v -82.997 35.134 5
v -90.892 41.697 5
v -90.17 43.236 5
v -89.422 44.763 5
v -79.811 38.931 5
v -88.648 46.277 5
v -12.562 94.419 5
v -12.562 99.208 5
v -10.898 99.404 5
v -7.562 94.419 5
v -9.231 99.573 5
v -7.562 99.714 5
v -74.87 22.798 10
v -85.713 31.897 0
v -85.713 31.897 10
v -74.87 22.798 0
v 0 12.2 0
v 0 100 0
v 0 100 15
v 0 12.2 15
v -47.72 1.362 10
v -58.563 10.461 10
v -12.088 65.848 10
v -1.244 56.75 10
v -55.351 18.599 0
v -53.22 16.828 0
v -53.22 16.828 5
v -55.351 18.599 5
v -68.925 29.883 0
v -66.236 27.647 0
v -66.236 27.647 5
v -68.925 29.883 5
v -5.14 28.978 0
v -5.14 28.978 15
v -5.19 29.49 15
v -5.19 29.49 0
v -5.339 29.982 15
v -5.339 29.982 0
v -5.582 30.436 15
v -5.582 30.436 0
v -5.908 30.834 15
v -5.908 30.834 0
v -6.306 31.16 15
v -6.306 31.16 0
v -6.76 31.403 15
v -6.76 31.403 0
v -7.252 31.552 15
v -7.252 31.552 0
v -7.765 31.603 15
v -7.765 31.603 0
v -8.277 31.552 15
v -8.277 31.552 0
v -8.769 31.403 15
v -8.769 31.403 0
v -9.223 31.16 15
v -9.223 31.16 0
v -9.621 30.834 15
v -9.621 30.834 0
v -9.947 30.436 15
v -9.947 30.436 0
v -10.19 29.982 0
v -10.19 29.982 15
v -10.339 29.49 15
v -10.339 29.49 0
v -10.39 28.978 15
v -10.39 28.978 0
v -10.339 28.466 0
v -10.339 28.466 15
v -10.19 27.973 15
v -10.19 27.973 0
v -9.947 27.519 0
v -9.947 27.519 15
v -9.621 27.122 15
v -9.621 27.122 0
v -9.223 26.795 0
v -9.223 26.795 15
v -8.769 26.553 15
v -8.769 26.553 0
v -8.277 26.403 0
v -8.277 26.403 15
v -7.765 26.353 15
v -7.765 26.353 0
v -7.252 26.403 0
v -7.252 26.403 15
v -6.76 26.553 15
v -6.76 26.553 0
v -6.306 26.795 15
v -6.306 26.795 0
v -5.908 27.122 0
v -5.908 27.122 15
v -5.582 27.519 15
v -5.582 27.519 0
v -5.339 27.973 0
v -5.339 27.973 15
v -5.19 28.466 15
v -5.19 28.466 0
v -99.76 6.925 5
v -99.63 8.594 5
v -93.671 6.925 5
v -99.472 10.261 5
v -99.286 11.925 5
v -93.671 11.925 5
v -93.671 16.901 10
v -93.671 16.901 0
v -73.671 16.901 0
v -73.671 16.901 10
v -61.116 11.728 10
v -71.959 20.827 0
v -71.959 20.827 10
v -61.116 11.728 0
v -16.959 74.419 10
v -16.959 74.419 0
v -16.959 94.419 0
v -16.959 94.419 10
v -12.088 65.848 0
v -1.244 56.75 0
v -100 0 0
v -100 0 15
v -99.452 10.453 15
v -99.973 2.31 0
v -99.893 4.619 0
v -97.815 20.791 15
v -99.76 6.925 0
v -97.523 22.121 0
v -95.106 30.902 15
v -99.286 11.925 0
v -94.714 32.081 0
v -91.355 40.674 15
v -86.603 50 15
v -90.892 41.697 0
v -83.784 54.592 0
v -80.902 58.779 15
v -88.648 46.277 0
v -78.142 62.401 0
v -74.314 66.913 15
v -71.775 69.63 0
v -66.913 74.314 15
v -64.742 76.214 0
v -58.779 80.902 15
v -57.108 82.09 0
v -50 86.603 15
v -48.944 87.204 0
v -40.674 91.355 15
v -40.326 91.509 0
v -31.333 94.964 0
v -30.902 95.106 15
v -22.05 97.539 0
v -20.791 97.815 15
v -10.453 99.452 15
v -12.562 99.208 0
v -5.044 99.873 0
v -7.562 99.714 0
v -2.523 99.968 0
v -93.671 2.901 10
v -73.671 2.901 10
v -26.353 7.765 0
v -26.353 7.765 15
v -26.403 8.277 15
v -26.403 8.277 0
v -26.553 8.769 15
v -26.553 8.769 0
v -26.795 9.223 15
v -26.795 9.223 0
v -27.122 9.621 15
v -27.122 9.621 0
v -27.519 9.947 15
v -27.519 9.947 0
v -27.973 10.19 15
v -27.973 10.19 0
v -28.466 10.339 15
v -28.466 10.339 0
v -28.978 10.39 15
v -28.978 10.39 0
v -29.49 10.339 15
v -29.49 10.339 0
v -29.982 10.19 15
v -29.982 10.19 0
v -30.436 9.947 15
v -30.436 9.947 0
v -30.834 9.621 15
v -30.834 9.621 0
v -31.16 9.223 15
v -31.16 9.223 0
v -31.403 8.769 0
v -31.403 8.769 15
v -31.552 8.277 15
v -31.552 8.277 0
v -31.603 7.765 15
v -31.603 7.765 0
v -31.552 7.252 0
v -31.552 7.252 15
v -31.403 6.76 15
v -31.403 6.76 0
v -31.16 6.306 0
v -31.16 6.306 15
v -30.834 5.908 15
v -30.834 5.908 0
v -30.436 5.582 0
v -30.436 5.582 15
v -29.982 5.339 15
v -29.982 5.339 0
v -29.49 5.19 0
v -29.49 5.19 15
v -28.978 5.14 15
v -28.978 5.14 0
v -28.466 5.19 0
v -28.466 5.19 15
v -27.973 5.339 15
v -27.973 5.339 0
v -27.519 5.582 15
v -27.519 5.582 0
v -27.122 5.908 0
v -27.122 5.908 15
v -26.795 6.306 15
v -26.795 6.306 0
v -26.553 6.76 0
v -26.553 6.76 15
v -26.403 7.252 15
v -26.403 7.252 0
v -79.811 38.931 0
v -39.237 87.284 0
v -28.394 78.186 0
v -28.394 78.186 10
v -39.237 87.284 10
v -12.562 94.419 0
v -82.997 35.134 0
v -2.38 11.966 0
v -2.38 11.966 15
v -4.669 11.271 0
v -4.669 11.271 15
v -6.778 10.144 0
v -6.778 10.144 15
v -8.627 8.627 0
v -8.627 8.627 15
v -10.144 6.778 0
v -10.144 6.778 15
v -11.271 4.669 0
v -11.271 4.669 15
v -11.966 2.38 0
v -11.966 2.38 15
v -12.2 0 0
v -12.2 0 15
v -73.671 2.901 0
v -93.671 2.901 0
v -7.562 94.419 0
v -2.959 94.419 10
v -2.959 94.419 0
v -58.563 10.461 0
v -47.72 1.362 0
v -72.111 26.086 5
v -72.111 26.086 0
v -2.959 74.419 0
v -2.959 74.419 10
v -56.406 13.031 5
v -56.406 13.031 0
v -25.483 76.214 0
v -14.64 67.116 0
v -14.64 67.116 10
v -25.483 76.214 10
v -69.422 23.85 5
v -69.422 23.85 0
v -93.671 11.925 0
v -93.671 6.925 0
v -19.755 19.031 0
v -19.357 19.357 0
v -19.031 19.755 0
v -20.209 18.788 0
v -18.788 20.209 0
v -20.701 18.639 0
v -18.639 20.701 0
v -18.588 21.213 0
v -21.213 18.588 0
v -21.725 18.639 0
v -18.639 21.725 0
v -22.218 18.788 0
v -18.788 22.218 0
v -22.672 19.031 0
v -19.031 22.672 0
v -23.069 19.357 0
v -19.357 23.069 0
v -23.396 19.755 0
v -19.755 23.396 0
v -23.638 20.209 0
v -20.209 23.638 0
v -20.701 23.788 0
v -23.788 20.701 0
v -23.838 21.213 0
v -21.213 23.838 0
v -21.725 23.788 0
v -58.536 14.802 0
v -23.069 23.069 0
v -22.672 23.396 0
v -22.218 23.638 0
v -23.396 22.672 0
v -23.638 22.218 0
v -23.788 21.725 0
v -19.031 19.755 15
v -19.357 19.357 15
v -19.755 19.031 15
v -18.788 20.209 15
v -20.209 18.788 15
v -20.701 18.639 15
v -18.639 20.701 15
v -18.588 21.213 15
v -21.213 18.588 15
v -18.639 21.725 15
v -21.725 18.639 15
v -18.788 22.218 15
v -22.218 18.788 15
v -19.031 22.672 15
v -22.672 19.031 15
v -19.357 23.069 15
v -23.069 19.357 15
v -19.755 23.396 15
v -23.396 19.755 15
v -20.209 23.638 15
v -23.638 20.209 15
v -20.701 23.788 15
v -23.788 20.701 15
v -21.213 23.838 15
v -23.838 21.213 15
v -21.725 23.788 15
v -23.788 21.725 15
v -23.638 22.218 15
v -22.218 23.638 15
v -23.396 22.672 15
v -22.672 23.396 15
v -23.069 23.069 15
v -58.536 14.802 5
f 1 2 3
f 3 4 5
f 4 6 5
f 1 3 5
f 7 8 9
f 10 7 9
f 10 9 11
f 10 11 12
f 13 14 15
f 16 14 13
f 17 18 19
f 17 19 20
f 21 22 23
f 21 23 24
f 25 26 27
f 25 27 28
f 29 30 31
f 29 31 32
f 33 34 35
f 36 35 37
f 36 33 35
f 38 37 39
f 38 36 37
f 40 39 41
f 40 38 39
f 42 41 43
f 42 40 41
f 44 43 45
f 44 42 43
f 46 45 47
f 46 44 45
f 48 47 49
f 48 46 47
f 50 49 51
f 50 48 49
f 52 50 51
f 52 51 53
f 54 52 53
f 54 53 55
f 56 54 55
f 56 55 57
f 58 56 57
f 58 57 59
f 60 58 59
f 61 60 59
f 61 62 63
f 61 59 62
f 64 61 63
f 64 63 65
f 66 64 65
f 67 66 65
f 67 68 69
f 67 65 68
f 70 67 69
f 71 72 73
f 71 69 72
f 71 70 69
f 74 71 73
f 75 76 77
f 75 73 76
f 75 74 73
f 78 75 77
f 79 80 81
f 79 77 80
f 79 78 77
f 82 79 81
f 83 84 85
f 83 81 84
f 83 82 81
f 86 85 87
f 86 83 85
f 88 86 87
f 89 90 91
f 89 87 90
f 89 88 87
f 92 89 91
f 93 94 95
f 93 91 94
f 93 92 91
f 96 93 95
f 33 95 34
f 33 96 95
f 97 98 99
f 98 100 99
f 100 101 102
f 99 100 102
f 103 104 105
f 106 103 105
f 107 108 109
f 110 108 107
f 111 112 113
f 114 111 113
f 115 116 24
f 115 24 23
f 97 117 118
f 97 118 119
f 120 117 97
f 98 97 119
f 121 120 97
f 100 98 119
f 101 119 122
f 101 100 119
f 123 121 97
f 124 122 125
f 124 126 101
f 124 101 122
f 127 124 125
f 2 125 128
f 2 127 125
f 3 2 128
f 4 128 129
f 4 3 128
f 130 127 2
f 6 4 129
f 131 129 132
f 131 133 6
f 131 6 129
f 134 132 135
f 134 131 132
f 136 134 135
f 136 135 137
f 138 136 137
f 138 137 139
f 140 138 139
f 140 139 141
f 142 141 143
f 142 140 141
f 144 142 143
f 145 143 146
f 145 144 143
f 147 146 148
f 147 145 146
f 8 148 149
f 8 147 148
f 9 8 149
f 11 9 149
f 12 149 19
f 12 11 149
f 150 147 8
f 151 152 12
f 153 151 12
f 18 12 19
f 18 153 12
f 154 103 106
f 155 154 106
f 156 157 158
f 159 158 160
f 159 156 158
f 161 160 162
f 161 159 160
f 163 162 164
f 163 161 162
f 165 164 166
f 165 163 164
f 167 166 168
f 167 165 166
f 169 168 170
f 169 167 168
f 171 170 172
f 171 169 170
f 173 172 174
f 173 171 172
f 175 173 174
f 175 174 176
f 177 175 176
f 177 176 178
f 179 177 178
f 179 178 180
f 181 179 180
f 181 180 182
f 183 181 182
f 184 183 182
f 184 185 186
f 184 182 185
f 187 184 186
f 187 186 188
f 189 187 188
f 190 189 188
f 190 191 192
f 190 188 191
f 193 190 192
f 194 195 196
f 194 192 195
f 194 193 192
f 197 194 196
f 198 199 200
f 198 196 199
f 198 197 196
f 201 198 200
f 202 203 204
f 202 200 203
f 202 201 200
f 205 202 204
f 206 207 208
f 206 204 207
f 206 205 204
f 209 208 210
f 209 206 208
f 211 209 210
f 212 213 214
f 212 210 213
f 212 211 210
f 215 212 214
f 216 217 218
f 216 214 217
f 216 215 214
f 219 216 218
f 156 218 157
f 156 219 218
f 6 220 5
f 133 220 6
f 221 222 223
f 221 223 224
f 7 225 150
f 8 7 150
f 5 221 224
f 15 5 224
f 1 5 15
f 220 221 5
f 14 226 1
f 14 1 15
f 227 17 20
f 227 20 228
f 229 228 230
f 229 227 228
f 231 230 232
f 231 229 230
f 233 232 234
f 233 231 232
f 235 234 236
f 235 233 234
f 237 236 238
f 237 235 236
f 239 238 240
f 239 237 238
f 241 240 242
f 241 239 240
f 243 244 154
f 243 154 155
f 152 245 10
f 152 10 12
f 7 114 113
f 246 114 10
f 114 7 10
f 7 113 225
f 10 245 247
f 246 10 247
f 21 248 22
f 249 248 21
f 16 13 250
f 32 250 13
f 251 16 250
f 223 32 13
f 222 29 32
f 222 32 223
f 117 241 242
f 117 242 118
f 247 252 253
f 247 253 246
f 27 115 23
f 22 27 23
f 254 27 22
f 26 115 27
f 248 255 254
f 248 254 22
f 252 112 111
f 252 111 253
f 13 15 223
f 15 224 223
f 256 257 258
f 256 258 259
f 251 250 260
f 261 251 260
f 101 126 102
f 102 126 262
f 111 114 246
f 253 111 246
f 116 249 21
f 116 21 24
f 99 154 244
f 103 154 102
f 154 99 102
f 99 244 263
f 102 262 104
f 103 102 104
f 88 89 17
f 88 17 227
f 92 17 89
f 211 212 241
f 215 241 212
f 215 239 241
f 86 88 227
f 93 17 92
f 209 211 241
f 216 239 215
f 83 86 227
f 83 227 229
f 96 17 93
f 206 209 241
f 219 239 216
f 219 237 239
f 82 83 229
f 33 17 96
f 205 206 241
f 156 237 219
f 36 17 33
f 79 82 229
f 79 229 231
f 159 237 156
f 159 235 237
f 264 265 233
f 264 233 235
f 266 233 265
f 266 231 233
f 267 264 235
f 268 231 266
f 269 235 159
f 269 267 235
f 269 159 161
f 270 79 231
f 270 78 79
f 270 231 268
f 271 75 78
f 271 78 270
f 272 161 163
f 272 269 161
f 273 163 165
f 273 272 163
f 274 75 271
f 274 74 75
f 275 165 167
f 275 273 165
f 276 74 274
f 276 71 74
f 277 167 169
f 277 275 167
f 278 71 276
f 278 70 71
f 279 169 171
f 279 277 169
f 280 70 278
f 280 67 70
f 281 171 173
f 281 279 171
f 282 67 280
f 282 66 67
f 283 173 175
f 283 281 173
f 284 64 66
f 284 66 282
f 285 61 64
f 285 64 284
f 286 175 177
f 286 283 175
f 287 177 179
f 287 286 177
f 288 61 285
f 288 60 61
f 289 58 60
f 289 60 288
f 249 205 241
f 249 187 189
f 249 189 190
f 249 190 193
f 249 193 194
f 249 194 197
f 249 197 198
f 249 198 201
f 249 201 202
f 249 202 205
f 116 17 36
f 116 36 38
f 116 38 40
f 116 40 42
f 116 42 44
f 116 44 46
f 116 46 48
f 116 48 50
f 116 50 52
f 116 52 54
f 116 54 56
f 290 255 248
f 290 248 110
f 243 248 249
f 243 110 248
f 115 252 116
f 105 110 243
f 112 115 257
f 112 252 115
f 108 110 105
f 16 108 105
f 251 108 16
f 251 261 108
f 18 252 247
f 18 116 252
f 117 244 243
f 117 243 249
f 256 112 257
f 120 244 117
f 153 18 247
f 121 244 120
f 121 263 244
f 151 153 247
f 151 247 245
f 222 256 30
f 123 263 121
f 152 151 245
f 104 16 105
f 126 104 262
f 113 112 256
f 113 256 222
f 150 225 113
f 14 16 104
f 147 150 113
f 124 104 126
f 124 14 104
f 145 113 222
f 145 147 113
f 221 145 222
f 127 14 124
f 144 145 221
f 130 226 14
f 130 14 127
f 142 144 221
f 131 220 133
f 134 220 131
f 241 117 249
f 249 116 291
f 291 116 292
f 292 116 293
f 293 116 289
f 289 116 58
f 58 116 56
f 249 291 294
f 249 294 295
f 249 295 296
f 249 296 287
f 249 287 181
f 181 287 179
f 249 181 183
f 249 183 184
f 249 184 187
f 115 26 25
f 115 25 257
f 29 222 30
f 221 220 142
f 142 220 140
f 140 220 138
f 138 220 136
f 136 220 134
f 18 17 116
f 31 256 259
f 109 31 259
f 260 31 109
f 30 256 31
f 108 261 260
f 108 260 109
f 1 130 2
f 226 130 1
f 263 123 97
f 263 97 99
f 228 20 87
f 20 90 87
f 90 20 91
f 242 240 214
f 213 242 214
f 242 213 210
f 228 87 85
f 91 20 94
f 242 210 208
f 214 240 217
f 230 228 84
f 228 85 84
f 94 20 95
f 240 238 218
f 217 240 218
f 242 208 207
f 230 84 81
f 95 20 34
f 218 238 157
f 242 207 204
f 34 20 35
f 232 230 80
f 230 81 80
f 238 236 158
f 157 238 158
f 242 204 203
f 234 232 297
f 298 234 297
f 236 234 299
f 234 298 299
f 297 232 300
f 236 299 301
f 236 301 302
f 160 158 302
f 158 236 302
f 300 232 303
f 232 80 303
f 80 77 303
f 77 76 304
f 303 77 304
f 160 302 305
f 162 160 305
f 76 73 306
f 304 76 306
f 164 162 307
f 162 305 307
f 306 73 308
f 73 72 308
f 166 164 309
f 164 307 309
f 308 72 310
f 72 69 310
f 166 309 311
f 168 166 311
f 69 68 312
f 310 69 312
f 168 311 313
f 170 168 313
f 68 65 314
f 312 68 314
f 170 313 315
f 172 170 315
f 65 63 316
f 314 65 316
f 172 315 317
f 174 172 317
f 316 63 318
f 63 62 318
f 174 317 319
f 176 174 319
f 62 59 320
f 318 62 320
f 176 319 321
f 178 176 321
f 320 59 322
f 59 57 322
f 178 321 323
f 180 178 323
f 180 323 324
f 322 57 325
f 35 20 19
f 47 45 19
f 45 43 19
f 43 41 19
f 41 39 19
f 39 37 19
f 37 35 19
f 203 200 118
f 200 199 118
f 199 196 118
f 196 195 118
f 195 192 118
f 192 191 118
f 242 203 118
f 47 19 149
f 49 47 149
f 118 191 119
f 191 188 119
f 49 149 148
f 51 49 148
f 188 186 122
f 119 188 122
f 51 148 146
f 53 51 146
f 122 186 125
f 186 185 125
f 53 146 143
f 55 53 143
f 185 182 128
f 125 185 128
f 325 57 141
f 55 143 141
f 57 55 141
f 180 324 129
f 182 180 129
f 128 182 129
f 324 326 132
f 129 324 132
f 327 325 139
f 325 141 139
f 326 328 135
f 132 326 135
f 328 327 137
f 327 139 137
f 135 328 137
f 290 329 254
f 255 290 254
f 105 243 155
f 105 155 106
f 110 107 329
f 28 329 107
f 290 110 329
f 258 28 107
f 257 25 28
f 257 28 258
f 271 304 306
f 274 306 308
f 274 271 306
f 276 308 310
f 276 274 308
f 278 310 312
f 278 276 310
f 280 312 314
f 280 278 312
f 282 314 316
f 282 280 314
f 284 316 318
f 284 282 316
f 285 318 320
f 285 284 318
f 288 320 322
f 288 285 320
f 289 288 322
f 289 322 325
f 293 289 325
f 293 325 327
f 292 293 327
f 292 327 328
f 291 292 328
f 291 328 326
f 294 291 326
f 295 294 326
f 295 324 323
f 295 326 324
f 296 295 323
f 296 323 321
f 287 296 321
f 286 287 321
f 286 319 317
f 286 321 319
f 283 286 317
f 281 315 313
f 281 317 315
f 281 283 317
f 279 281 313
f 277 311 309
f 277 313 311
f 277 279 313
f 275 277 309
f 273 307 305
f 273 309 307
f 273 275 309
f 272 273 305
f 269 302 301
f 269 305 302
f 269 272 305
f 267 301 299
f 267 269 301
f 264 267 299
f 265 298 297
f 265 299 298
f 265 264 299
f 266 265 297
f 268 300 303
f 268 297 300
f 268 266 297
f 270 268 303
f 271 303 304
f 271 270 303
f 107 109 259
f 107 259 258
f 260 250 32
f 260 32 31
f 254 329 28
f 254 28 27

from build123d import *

# Parameters (mm, degrees)
BOSS_EXTRUDE1_DEPTH = 15
SKETCH2_R           = 2.625
CUT_EXTRUDE1_DEPTH  = 16
SKETCH3_R           = 12.2
CUT_EXTRUDE2_DEPTH  = 20
CUT_EXTRUDE5_DEPTH  = 10
SKETCH6_W           = 14
SKETCH6_H           = 20
SKETCH6_W_2         = 20
SKETCH6_H_2         = 14
CUT_EXTRUDE6_DEPTH  = 10
SKETCH8_W           = 10
SKETCH8_H           = 5
SKETCH8_W_2         = 5
SKETCH8_H_2         = 10
CUT_EXTRUDE7_DEPTH  = 5


with BuildPart() as part:
    # Sketch1 → Boss-Extrude1 (new body)
    with BuildSketch(Plane.XY):
        with BuildLine():
            Line((0, 100), (0, 0))
            Line((0, 0), (-100, 0))
            ThreePointArc((-100, 0), (-70.710678118, 70.710678118), (0, 100))
        make_face()
    extrude(amount=BOSS_EXTRUDE1_DEPTH)

    # Sketch2 → Cut-Extrude1 (cut, through all)
    with BuildSketch(Plane.XY):
        with Locations((-7.76457135, 28.97777479)):
            Circle(SKETCH2_R)
        with Locations((-21.213203434, 21.213203438)):
            Circle(SKETCH2_R)
        with Locations((-28.977774788, 7.764571356)):
            Circle(SKETCH2_R)
    extrude(amount=CUT_EXTRUDE1_DEPTH, mode=Mode.SUBTRACT)

    # Sketch3 → Cut-Extrude2 (cut)
    with BuildSketch(Plane.XY):
        Circle(SKETCH3_R)
    extrude(amount=CUT_EXTRUDE2_DEPTH, mode=Mode.SUBTRACT)

    # Sketch5 → Cut-Extrude5 (cut)
    with BuildSketch(Plane.XY):
        Polygon((-71.95873614, 20.826742868), (-61.115668074, 11.728328454), (-14.639983633, 67.115892355), (-25.483051698, 76.21430677), align=None)
        Polygon((-58.563247101, 10.460640314), (-47.720179035, 1.3622259), (-1.244494594, 56.749789802), (-12.087562659, 65.848204216), align=None)
        Polygon((-85.713169601, 31.896516461), (-74.870101536, 22.798102046), (-28.394417094, 78.185665948), (-39.237485159, 87.284080363), align=None)
    extrude(amount=CUT_EXTRUDE5_DEPTH, mode=Mode.SUBTRACT)

    # Sketch6 → Cut-Extrude6 (cut)
    with BuildSketch(Plane.XY):
        with Locations((-9.9593736, 84.419453757)):
            Rectangle(SKETCH6_W, SKETCH6_H)
        with Locations((-83.670510765, 9.900506549)):
            Rectangle(SKETCH6_W_2, SKETCH6_H_2)
    extrude(amount=CUT_EXTRUDE6_DEPTH, mode=Mode.SUBTRACT)

    # Sketch8 → Cut-Extrude7 (cut)
    with BuildSketch(Plane.XY):
        Polygon((-43.599799459, 8.831466661), (-89.403952996, 46.904961374), (-92.064810722, 42.671778628), (-46.260657185, 4.598283915), align=None)
        with Locations((-96.259669563, 9.424871496)):
            Rectangle(SKETCH8_W, SKETCH8_H)
        with Locations((-10.06190419, 97.056119442)):
            Rectangle(SKETCH8_W_2, SKETCH8_H_2)
    extrude(amount=CUT_EXTRUDE7_DEPTH, mode=Mode.SUBTRACT)


solid = part.part
